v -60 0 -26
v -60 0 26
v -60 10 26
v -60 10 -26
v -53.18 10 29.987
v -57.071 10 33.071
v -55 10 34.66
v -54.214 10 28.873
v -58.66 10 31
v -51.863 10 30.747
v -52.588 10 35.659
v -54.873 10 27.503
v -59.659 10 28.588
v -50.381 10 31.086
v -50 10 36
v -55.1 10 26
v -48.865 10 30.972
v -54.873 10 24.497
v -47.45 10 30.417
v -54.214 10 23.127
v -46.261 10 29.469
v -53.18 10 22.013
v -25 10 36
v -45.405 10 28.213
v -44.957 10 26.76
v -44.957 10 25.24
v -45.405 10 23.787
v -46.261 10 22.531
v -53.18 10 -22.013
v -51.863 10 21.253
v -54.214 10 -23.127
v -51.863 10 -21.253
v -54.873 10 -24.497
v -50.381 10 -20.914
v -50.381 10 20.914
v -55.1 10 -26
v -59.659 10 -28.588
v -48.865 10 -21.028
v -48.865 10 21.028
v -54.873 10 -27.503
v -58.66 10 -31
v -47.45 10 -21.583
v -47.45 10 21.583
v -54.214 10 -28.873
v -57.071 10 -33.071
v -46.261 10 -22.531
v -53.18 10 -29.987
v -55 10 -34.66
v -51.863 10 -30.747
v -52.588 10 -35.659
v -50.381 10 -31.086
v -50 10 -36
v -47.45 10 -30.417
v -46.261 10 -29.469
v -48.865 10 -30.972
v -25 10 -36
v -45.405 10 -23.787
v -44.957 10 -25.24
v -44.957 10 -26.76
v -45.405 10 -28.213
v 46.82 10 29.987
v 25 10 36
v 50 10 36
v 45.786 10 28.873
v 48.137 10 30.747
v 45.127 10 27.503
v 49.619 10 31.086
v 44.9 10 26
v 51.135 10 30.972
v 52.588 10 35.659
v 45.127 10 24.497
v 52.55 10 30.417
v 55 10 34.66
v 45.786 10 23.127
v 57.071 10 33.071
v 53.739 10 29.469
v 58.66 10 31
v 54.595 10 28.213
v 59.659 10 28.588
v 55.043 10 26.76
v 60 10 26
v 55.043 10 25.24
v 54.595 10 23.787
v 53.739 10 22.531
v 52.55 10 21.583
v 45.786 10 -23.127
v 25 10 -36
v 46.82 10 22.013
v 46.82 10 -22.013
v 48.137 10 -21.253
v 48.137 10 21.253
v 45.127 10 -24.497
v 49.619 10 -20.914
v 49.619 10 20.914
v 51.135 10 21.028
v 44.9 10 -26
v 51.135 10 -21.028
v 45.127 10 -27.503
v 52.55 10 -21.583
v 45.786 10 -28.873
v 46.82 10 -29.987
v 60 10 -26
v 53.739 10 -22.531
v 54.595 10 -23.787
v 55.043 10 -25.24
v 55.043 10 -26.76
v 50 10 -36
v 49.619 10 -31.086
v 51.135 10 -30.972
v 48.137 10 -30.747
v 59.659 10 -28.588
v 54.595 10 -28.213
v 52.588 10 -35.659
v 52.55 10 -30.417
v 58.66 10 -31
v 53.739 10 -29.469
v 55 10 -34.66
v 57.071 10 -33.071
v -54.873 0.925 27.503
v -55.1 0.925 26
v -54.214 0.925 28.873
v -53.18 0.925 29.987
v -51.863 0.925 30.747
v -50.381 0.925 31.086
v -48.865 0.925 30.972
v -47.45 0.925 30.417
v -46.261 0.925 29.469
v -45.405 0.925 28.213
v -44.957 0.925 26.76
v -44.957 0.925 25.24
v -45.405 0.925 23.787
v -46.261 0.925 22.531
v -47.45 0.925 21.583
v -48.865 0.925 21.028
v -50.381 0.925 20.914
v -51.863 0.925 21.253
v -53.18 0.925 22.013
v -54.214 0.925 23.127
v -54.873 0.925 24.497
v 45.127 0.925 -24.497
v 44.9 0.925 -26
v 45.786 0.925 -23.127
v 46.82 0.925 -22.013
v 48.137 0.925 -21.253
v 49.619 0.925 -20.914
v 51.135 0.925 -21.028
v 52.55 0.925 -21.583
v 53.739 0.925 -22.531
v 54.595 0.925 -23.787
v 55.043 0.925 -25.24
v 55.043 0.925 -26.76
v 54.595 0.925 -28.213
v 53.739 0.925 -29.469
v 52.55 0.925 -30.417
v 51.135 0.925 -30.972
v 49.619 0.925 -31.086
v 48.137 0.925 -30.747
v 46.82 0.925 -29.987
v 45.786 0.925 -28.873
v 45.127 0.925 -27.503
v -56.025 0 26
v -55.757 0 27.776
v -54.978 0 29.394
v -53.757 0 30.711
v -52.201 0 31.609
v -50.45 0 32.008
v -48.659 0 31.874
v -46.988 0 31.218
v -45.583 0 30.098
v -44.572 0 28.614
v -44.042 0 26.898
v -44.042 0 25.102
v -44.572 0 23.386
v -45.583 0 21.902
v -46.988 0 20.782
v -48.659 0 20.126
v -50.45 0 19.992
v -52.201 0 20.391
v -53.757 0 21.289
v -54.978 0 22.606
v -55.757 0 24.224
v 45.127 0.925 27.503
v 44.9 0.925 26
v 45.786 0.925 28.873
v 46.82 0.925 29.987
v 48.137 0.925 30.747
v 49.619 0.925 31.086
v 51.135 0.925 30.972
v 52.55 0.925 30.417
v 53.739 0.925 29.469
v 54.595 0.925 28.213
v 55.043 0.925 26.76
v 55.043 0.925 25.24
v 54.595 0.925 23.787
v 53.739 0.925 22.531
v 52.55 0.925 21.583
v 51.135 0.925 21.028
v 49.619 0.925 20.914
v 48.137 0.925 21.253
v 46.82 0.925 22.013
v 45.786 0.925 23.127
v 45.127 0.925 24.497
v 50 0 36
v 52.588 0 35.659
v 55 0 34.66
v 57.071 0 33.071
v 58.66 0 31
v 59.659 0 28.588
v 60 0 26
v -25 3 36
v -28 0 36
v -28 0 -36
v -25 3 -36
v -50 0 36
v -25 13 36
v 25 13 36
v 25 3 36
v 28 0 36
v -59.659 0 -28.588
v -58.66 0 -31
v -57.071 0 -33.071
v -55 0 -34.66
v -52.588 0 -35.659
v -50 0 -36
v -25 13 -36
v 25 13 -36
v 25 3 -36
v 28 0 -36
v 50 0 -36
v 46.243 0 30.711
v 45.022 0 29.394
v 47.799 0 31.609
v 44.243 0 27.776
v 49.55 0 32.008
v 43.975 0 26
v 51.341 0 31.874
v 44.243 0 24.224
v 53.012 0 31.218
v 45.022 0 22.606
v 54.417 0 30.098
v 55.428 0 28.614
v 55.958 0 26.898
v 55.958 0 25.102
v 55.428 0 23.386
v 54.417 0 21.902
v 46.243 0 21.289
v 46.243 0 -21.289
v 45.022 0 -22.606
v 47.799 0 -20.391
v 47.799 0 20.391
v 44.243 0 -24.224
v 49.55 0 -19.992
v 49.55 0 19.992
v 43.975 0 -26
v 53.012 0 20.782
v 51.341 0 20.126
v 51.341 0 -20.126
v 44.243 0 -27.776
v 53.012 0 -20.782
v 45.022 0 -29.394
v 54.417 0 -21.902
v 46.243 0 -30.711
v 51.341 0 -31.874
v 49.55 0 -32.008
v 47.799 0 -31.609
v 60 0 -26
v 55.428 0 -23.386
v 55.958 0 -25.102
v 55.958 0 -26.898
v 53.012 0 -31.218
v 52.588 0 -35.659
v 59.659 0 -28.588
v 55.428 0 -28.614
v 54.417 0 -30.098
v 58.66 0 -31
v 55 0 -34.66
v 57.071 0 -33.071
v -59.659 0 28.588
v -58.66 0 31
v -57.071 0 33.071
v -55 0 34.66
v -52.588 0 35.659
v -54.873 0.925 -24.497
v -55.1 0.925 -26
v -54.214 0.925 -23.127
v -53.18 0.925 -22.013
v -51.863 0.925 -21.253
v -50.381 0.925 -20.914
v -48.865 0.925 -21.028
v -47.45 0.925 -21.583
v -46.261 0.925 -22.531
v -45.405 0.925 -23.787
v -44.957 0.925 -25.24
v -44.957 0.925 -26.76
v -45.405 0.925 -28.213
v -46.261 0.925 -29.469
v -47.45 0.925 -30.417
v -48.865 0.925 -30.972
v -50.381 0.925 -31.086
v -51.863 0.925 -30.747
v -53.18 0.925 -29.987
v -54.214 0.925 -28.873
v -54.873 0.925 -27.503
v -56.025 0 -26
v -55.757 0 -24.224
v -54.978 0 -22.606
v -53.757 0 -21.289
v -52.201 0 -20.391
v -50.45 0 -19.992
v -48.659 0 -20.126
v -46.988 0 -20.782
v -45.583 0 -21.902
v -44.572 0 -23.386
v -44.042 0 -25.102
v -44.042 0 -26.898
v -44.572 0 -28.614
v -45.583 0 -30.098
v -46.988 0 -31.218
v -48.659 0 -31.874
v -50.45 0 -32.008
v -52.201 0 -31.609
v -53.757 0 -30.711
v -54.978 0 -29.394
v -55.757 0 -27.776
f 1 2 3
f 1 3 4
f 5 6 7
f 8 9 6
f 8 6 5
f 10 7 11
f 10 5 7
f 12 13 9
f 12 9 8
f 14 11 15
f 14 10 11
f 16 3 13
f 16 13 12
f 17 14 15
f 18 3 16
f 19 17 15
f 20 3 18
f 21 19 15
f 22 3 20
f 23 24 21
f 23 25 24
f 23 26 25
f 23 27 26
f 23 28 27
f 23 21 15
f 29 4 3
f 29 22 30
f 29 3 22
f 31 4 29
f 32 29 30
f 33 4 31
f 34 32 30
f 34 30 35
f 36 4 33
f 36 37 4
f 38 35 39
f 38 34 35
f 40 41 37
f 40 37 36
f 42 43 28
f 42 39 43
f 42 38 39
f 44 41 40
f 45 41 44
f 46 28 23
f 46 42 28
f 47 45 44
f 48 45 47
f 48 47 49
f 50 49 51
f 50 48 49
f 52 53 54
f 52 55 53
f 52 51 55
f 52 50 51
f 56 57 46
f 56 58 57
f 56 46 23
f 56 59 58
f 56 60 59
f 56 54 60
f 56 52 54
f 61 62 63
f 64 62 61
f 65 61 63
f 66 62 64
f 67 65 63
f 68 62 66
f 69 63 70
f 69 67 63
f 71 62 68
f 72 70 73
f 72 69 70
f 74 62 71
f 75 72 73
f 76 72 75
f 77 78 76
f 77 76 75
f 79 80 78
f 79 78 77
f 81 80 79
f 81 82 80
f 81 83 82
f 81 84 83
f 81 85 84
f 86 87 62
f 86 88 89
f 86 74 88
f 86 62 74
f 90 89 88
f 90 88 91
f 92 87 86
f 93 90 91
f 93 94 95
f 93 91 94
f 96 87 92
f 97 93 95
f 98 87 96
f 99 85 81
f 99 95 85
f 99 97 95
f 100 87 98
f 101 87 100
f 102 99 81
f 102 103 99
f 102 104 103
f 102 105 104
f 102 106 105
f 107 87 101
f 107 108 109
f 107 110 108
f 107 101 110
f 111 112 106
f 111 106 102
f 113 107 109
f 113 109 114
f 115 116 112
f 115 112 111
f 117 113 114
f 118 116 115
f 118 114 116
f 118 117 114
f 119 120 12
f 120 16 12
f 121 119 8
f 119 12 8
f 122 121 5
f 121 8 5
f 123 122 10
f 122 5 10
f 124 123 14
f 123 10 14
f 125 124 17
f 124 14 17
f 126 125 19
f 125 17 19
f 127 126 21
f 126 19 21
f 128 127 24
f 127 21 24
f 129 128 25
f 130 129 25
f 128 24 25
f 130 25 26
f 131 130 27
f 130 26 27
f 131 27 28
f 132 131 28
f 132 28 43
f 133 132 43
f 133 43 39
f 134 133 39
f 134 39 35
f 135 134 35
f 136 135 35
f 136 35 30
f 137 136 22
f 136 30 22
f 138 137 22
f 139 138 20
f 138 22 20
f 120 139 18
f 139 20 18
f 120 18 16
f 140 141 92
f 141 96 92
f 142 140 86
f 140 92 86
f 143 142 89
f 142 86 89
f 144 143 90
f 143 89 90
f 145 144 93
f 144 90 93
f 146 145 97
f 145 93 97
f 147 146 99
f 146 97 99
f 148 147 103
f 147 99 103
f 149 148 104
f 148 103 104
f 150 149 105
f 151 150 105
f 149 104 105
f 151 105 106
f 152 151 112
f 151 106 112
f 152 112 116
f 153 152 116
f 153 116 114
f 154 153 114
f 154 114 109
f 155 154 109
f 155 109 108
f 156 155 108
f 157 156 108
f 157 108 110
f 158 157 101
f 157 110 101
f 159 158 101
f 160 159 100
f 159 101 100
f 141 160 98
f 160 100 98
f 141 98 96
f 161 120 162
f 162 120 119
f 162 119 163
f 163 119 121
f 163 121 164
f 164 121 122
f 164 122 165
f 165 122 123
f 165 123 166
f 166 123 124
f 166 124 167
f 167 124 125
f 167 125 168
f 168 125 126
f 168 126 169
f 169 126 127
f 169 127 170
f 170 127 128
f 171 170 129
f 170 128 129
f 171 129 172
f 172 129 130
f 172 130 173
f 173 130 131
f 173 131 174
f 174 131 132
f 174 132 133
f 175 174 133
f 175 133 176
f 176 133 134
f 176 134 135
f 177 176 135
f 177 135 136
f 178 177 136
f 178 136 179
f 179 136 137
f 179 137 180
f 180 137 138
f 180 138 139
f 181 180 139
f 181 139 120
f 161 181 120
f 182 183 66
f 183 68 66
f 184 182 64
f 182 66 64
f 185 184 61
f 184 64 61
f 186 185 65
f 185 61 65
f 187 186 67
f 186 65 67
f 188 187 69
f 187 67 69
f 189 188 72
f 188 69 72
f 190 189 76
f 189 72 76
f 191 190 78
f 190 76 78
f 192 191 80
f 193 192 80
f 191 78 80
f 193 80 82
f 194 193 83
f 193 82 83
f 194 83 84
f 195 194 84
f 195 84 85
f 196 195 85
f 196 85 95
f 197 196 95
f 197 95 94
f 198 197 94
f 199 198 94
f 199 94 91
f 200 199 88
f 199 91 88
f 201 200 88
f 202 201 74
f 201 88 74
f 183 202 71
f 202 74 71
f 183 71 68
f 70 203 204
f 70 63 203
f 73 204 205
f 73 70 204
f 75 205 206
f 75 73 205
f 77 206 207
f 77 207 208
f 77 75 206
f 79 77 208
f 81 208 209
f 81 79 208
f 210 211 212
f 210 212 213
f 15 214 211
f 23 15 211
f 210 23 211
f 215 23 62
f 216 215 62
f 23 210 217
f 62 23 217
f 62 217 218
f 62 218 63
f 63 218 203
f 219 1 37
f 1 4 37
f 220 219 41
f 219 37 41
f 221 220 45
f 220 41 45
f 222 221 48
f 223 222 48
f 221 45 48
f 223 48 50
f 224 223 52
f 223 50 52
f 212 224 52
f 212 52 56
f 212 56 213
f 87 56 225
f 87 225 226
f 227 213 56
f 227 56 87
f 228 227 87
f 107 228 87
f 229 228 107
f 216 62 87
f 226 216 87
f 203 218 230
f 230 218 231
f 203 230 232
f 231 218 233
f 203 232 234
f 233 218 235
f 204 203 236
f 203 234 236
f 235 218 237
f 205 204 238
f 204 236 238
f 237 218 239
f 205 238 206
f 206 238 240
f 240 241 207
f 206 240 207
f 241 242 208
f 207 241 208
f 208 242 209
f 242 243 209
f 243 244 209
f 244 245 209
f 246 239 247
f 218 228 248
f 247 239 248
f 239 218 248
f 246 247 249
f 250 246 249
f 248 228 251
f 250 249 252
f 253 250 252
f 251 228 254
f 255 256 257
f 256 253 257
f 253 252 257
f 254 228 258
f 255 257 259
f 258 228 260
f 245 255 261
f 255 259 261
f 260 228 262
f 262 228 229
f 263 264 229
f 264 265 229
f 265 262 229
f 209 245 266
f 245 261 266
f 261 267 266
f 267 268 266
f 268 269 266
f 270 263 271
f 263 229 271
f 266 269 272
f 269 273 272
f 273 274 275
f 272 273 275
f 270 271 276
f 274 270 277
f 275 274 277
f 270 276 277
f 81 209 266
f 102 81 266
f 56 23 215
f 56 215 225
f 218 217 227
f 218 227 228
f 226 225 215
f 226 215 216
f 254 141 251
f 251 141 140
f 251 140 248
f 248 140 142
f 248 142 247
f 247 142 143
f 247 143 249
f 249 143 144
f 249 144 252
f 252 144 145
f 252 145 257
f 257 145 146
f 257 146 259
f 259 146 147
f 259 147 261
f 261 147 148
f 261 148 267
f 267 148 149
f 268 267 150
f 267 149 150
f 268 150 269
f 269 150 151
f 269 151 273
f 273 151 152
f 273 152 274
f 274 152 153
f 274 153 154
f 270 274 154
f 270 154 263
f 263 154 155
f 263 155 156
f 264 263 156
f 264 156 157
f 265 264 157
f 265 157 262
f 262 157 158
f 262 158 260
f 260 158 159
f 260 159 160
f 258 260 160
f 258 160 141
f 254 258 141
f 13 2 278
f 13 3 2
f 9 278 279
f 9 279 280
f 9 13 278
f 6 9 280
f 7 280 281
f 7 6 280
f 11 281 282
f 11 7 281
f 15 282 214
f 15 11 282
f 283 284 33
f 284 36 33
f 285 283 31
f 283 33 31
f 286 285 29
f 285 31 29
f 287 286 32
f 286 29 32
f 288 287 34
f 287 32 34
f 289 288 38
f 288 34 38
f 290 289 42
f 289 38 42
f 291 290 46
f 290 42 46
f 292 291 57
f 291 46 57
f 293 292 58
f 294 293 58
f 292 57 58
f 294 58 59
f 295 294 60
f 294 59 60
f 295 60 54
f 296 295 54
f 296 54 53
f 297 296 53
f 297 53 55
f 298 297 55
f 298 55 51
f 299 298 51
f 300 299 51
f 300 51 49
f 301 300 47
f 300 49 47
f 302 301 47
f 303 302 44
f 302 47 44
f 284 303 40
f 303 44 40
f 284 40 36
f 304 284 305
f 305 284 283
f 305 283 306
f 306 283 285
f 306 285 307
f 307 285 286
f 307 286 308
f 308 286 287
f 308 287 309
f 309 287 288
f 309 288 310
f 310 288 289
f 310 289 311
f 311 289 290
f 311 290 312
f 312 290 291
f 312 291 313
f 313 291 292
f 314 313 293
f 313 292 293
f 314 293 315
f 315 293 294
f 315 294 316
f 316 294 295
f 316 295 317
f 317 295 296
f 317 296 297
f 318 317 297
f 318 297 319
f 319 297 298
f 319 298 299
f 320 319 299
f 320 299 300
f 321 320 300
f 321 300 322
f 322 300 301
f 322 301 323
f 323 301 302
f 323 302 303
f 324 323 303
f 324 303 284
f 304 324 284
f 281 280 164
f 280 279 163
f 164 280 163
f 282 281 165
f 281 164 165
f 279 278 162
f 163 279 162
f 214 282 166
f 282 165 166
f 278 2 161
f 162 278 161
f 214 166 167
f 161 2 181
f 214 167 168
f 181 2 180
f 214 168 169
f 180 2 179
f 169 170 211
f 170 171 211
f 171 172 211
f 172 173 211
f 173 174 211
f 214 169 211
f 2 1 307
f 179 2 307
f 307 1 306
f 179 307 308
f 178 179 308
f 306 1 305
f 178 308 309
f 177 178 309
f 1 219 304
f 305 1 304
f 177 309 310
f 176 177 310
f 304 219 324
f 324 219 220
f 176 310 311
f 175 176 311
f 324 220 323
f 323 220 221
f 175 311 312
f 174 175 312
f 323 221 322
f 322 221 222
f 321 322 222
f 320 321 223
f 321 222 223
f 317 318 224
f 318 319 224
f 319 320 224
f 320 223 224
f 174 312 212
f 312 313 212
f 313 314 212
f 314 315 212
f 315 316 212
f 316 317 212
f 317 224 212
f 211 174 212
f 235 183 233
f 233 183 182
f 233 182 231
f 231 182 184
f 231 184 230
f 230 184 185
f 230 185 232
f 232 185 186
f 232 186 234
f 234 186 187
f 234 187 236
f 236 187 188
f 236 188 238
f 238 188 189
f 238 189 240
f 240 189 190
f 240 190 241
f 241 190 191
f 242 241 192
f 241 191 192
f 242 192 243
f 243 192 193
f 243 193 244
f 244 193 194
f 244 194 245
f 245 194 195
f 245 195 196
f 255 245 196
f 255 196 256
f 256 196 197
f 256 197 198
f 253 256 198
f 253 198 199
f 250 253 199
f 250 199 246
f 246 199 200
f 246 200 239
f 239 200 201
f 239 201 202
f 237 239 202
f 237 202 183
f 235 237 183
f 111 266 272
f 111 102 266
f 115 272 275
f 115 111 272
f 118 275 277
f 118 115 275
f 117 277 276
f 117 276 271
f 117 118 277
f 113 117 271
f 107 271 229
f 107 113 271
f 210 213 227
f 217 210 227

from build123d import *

# Parameters (mm, degrees)
SKETCH1_W                    = 120
SKETCH1_H                    = 72
BOSS_EXTRUDE1_DEPTH          = 10
FILLET1_R                    = 10
M12_TAPPED_HOLE1_D           = 10.2
M12_TAPPED_HOLE1_CSINK_D     = 12.05
M12_TAPPED_HOLE1_CSINK_ANGLE = 90
BOSS_EXTRUDE2_START          = 10
SKETCH4_W                    = 50
SKETCH4_H                    = 72
BOSS_EXTRUDE2_DEPTH          = 3
CUT_EXTRUDE1_DEPTH           = 72.168813395
CUT_EXTRUDE1_DEPTH_BACK      = 72.168813395


with BuildPart() as part:
    # Sketch1 → Boss-Extrude1 (new body)
    with BuildSketch(Plane(origin=(0, 0, 0), x_dir=(1, 0, 0), z_dir=(0, 1, 0))):
        Rectangle(SKETCH1_W, SKETCH1_H)
    extrude(amount=BOSS_EXTRUDE1_DEPTH)

    # Fillet1
    fillet1_edges = [part.edges().sort_by_distance(p)[0] for p in [
        (60, 5, 36),
        (-60, 5, 36),
        (-60, 5, -36),
        (60, 5, -36),
    ]]
    fillet(fillet1_edges, radius=FILLET1_R)

    # M12 Tapped Hole1 (through all)
    with Locations(Plane.XZ):
        with Locations((-50, -26), (50, -26), (50, 26), (-50, 26)):
            CounterSinkHole(M12_TAPPED_HOLE1_D / 2, M12_TAPPED_HOLE1_CSINK_D / 2, counter_sink_angle=M12_TAPPED_HOLE1_CSINK_ANGLE)

    # Sketch4 → Boss-Extrude2 (add)
    with BuildSketch(Plane(origin=(0, 0, 0), x_dir=(1, 0, 0), z_dir=(0, 1, 0)).offset(BOSS_EXTRUDE2_START)):
        Rectangle(SKETCH4_W, SKETCH4_H)
    extrude(amount=BOSS_EXTRUDE2_DEPTH)

    # Sketch5 → Cut-Extrude1 (cut, two sides: drawn at the far end of the back side and taken through both)
    with BuildSketch(Plane.XY.offset(-CUT_EXTRUDE1_DEPTH_BACK)):
        Polygon((-28, 0), (-25, 3), (25, 3), (28, 0), align=None)
    extrude(amount=CUT_EXTRUDE1_DEPTH + CUT_EXTRUDE1_DEPTH_BACK, mode=Mode.SUBTRACT)


solid = part.part
